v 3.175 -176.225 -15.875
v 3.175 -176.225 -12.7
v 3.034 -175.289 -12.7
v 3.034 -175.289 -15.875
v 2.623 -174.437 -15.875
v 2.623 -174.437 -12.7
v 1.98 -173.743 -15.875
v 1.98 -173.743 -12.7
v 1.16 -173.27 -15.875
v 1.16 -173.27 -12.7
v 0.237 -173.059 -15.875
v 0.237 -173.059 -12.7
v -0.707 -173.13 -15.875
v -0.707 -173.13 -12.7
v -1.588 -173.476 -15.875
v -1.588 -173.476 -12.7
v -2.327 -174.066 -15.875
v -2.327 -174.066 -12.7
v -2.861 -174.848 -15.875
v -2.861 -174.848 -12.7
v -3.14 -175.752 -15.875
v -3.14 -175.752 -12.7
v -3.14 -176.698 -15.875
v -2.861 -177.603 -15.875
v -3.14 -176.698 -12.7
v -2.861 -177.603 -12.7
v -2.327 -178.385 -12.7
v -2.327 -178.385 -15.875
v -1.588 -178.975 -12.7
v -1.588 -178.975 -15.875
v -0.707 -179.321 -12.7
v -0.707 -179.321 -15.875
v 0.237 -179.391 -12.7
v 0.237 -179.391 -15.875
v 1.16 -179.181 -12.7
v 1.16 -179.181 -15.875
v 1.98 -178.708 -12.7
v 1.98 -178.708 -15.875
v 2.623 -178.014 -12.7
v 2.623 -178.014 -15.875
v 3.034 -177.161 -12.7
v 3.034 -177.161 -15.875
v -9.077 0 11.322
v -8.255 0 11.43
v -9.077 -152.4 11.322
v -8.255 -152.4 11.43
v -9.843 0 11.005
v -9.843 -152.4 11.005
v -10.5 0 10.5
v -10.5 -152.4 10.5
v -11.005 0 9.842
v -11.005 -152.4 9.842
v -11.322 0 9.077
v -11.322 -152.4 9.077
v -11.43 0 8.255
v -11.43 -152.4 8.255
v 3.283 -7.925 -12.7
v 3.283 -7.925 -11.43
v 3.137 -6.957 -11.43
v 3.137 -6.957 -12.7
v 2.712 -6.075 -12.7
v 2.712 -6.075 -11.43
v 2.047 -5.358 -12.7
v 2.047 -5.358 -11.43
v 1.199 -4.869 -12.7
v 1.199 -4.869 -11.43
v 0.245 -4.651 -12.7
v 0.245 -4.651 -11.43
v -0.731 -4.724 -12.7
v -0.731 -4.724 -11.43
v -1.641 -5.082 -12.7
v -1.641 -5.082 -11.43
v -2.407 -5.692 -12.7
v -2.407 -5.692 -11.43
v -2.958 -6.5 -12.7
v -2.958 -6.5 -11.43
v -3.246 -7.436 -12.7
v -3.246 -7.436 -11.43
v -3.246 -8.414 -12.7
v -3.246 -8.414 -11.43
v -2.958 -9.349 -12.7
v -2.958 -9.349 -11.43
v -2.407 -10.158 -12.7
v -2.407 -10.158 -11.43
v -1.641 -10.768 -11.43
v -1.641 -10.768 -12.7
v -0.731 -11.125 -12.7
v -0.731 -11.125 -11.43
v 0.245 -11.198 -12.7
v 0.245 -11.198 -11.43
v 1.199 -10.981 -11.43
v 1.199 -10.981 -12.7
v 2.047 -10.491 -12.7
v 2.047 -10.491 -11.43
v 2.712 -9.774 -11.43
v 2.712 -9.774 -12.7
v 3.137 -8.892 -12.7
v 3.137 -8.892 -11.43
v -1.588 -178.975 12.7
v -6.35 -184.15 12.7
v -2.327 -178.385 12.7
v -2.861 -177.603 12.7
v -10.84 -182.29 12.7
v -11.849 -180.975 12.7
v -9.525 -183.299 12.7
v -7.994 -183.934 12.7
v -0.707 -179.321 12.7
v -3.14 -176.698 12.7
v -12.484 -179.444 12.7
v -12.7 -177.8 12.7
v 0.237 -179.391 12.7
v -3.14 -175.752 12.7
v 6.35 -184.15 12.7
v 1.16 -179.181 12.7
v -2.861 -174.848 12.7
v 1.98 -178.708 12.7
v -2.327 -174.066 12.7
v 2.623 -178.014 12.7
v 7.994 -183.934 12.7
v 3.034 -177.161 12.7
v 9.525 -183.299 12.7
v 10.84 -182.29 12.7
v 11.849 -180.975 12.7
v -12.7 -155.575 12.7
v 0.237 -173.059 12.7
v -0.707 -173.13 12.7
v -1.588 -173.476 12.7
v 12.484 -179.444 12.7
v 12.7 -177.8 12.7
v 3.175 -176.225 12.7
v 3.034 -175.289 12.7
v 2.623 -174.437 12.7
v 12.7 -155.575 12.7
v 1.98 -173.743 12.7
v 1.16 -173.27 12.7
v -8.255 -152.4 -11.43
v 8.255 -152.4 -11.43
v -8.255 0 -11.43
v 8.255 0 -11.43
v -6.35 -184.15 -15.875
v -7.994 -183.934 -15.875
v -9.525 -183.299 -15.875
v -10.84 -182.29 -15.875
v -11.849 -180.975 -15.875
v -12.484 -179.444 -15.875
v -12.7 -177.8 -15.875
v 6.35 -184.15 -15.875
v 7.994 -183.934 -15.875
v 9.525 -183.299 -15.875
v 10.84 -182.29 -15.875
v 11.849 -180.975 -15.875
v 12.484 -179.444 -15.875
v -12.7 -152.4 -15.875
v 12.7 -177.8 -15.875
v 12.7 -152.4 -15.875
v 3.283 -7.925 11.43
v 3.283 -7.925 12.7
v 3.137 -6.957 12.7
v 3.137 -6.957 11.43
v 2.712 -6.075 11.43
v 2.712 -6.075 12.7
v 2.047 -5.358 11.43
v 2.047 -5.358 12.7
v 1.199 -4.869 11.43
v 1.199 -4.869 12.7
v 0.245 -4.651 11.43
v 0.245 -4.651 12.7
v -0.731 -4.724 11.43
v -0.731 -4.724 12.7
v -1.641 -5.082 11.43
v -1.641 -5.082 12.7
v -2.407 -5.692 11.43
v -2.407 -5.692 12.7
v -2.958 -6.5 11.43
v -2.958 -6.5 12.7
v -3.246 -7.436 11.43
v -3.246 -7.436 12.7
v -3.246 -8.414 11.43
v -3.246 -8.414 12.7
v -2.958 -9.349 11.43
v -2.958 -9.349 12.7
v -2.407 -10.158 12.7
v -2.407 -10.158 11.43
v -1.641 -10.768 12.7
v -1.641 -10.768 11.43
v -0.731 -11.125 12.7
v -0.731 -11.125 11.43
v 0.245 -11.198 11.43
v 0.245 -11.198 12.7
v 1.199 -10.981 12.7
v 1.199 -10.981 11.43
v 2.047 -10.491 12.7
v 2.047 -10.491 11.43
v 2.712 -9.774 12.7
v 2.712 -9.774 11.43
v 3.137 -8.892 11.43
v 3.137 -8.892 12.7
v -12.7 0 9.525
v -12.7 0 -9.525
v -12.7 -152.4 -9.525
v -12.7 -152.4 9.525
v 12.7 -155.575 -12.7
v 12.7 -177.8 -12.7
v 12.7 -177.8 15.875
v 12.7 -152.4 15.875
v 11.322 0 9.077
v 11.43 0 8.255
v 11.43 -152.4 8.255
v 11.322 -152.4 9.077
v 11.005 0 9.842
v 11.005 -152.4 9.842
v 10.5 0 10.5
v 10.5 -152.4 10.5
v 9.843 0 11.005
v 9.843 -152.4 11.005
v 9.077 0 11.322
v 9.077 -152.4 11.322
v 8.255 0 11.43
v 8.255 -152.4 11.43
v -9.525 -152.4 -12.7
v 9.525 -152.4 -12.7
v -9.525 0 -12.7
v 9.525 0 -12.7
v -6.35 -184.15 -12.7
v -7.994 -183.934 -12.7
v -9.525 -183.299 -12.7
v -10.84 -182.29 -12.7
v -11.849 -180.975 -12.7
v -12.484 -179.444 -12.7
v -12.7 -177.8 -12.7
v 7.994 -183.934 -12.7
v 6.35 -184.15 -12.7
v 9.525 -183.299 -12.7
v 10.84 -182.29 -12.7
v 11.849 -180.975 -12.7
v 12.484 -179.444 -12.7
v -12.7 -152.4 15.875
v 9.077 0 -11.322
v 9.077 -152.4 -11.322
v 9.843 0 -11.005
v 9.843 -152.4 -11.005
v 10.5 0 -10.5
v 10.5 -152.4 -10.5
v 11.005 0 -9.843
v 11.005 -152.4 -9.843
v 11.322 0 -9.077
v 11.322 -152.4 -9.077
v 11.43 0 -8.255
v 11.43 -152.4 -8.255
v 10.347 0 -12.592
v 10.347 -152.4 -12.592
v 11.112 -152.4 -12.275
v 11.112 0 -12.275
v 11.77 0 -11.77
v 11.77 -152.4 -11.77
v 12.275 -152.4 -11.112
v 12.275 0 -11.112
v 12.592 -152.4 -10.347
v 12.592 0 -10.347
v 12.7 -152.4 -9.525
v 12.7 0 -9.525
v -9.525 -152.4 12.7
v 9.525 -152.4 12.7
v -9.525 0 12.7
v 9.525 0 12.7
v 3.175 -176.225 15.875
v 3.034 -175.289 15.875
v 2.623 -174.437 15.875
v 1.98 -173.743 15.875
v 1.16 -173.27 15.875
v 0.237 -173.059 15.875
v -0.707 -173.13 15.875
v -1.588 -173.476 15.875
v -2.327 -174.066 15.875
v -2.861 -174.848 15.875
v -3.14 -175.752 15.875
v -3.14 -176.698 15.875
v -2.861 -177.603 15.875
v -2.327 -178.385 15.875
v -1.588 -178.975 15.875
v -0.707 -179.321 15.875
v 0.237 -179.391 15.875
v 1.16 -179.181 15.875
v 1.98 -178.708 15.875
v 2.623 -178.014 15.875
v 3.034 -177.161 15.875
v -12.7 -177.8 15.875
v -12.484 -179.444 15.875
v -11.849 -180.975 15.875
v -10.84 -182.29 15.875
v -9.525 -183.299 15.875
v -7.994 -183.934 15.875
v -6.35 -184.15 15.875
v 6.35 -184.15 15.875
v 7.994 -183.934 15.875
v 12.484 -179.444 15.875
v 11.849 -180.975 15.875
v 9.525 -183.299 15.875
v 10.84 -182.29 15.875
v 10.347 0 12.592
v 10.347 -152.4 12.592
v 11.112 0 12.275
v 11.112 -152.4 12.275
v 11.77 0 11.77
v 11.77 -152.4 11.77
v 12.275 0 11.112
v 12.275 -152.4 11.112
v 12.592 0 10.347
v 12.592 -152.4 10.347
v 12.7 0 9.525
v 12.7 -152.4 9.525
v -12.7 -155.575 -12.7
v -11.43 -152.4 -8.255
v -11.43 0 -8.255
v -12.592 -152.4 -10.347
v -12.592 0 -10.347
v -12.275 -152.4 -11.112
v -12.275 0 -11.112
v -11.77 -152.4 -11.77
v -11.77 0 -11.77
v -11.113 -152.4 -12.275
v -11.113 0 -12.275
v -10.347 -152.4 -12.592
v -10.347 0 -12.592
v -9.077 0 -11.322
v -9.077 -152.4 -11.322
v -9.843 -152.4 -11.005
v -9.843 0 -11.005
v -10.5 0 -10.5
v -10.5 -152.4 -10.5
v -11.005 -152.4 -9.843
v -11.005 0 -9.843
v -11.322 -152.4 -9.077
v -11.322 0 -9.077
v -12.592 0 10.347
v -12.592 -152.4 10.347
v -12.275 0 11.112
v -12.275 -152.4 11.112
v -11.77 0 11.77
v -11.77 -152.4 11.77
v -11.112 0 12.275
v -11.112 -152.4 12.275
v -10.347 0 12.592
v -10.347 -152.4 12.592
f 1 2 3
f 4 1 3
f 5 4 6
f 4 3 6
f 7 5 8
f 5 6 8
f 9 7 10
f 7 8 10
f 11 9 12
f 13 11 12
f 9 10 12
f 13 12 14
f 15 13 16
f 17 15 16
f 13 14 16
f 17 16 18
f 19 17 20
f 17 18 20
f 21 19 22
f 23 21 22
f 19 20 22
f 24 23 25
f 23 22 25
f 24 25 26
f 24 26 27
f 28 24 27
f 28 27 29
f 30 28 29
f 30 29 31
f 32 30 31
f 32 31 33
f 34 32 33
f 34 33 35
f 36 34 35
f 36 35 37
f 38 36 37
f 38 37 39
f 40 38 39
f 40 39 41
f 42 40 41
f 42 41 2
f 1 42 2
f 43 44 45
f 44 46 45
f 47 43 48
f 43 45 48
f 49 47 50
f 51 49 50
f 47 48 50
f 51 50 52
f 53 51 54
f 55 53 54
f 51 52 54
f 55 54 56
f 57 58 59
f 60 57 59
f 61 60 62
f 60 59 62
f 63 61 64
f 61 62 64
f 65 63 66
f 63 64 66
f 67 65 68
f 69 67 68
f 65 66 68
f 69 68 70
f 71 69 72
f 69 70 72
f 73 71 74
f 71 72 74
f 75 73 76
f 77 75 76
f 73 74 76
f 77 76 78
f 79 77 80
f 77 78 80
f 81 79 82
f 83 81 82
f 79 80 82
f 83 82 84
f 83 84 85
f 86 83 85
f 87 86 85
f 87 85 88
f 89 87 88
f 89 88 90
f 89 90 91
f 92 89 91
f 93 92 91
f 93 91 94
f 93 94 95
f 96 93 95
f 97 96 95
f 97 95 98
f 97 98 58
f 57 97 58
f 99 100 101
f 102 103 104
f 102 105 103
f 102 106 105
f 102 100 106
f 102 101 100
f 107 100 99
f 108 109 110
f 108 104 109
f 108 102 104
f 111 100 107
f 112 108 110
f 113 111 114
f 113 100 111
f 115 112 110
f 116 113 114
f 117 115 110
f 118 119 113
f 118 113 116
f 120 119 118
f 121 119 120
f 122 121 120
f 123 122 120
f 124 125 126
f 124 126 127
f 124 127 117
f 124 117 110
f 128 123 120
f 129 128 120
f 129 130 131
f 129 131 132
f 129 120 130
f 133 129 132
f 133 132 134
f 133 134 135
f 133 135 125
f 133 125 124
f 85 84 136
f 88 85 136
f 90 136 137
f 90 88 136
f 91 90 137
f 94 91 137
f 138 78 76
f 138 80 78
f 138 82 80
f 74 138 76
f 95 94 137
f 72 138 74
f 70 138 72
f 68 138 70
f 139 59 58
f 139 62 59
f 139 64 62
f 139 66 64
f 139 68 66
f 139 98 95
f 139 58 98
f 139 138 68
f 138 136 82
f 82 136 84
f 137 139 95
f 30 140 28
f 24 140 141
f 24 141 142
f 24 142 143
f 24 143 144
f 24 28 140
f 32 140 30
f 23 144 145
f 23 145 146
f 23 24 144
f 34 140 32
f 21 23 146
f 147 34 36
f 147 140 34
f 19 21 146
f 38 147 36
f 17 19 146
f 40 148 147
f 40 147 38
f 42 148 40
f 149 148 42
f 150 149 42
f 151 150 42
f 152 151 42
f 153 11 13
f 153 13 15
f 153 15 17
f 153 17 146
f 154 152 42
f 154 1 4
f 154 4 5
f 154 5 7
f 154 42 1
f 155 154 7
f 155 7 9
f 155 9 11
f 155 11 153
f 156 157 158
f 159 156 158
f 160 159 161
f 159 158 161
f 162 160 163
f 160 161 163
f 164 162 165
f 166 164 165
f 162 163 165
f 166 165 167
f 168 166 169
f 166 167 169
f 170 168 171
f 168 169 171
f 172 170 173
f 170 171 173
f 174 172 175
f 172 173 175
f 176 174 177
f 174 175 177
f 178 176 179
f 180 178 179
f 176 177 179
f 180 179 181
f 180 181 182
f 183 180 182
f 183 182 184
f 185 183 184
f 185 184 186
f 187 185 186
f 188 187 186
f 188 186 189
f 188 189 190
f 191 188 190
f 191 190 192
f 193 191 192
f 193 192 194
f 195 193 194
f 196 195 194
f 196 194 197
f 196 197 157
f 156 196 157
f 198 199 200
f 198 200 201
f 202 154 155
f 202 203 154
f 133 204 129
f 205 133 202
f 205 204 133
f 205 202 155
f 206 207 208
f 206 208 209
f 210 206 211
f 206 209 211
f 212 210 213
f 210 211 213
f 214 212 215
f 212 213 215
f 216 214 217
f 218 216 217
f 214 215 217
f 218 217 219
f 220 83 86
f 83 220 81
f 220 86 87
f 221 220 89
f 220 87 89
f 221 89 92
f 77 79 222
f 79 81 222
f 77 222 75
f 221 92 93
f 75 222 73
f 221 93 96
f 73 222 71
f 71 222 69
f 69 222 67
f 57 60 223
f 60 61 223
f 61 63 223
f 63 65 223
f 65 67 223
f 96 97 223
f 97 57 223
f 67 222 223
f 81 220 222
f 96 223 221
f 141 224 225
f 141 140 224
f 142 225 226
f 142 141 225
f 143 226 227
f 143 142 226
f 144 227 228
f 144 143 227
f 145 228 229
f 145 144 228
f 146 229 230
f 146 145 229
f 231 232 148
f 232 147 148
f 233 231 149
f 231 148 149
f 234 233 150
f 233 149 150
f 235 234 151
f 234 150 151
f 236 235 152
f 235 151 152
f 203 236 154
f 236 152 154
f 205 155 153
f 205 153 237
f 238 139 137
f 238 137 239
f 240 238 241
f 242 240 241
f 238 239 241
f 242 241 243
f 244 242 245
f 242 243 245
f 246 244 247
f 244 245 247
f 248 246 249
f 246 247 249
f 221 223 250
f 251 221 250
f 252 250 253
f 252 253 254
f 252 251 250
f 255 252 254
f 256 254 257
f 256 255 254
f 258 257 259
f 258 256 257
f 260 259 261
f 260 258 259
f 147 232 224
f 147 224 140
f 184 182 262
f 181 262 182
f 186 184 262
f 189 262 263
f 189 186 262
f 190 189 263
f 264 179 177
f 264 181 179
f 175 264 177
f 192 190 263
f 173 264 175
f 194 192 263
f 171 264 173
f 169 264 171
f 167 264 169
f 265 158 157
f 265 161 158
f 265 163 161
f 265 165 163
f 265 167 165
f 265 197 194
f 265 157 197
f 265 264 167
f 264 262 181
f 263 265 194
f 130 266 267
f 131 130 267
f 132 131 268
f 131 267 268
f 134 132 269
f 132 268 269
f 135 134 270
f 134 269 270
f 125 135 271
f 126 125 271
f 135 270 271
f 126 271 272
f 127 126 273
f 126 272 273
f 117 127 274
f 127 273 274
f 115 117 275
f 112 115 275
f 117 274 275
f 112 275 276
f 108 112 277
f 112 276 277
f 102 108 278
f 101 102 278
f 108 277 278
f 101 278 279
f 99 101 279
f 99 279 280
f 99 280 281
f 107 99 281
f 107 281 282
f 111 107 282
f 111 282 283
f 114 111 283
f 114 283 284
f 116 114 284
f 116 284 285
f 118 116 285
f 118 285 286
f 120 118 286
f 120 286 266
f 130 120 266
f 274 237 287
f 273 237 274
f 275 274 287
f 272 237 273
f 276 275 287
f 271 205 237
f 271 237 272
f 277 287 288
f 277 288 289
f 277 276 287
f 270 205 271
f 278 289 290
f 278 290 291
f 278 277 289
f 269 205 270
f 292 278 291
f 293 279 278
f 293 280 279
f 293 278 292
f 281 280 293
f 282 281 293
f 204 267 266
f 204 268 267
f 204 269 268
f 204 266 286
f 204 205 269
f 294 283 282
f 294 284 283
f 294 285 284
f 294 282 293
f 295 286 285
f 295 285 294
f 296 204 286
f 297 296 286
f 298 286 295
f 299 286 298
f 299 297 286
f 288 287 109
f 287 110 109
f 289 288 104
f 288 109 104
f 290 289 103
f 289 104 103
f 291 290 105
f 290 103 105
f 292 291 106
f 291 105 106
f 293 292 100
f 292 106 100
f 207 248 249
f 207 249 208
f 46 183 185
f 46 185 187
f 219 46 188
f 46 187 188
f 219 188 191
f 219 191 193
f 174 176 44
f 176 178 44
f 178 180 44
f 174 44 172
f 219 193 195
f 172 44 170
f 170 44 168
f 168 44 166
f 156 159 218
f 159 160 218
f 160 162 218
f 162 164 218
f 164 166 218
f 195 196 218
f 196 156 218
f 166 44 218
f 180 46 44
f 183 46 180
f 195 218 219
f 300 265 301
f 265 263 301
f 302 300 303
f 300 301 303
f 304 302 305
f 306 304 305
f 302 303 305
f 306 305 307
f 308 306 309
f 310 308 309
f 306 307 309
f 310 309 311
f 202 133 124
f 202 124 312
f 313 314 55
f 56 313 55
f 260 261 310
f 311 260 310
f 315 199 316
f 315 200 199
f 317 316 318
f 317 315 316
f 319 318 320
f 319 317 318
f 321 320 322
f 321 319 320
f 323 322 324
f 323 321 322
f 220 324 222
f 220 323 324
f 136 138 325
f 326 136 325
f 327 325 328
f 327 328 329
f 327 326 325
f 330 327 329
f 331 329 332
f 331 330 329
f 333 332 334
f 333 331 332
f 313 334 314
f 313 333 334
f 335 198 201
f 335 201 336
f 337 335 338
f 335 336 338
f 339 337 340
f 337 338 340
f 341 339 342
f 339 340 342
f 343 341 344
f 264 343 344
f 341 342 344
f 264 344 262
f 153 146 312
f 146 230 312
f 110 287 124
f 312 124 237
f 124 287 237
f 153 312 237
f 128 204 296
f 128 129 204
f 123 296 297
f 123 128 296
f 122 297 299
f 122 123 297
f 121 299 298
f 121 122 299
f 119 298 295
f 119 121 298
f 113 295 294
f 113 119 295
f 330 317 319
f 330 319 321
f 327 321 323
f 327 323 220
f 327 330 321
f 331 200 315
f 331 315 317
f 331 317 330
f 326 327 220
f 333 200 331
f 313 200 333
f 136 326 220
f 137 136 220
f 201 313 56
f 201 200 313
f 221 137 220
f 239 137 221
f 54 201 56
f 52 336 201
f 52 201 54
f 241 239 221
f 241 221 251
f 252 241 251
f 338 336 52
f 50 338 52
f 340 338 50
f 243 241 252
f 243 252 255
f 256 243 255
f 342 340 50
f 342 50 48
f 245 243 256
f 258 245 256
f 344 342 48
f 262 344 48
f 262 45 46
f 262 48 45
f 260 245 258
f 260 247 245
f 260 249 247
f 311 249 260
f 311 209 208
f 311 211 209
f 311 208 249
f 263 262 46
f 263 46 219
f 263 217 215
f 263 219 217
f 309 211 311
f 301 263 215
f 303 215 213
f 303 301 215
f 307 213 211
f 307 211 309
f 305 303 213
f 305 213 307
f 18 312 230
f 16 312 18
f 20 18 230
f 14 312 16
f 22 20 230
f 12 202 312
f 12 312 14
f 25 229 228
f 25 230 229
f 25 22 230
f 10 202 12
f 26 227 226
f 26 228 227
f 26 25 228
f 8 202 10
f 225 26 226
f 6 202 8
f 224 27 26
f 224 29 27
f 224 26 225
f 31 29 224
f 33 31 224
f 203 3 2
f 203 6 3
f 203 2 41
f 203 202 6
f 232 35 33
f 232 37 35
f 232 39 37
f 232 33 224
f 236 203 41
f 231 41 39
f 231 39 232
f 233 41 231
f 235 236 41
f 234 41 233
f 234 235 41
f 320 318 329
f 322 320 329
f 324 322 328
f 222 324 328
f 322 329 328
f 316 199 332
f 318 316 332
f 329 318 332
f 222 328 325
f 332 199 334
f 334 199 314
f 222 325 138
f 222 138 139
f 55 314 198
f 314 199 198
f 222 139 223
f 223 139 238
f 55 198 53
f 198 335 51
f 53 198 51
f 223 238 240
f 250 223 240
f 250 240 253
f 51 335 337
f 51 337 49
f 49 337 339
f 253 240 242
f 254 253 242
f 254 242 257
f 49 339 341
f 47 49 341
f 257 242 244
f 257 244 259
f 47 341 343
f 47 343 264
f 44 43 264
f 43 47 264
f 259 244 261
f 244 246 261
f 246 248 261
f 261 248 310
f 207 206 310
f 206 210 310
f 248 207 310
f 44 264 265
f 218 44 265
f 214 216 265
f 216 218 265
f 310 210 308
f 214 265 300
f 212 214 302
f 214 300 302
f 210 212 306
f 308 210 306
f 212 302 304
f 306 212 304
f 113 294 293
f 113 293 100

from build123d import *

# Parameters (mm, degrees)
F0_W     = 25.4
F0_H     = 25.4
F0_W_2   = 22.86
F0_H_2   = 22.86
F1_DEPTH = 152.4
F2_R     = 3.175
F3_R     = 3.282866
F4_DEPTH = 25.401
F6_DEPTH = 25.4
F7_R     = 3.175
F8_DEPTH = 31.751
F9_R     = 6.35


with BuildPart() as f1:
    # F0 (on Front) → F1 (new body)
    with BuildSketch(Plane.XZ):
        Rectangle(F0_W, F0_H)
        Rectangle(F0_W_2, F0_H_2, mode=Mode.SUBTRACT)
    extrude(amount=F1_DEPTH)

    # F2
    f2_edges = [f1.edges().sort_by_distance(p)[0] for p in [
        (12.7, -76.2, 12.7),
        (-12.7, -76.2, 12.7),
        (12.7, -76.2, -12.7),
        (-12.7, -76.2, -12.7),
        (11.43, -76.2, 11.43),
        (11.43, -76.2, -11.43),
        (-11.43, -76.2, 11.43),
        (-11.43, -76.2, -11.43),
    ]]
    fillet(f2_edges, radius=F2_R)

    # F3 (on face) → F4 (cut, through all)
    with BuildSketch(Plane.XY.offset(12.7)):
        with Locations((0, -7.9248)):
            Circle(F3_R)
    extrude(amount=-F4_DEPTH, mode=Mode.SUBTRACT)


with BuildPart() as f6:
    # F5 (on face) → F6 (new body)
    with BuildSketch(Plane.YZ.offset(12.7)):
        Polygon((-184.15, -15.875), (-152.4, -15.875), (-152.4, 15.875), (-184.15, 15.875), (-184.15, 12.7), (-155.575, 12.7), (-155.575, -12.7), (-184.15, -12.7), align=None)
    extrude(amount=-F6_DEPTH)

    # F7 (on face) → F8 (cut, through all)
    with BuildSketch(Plane.XY.offset(15.875)):
        with Locations((0, -176.2252)):
            Circle(F7_R)
    extrude(amount=-F8_DEPTH, mode=Mode.SUBTRACT)

    # F9
    f9_edges = [f6.edges().sort_by_distance(p)[0] for p in [
        (12.7, -184.15, 14.2875),
        (-12.7, -184.15, 14.2875),
        (12.7, -184.15, -14.2875),
        (-12.7, -184.15, -14.2875),
    ]]
    fillet(f9_edges, radius=F9_R)


solid = Compound([f1.part, f6.part])
